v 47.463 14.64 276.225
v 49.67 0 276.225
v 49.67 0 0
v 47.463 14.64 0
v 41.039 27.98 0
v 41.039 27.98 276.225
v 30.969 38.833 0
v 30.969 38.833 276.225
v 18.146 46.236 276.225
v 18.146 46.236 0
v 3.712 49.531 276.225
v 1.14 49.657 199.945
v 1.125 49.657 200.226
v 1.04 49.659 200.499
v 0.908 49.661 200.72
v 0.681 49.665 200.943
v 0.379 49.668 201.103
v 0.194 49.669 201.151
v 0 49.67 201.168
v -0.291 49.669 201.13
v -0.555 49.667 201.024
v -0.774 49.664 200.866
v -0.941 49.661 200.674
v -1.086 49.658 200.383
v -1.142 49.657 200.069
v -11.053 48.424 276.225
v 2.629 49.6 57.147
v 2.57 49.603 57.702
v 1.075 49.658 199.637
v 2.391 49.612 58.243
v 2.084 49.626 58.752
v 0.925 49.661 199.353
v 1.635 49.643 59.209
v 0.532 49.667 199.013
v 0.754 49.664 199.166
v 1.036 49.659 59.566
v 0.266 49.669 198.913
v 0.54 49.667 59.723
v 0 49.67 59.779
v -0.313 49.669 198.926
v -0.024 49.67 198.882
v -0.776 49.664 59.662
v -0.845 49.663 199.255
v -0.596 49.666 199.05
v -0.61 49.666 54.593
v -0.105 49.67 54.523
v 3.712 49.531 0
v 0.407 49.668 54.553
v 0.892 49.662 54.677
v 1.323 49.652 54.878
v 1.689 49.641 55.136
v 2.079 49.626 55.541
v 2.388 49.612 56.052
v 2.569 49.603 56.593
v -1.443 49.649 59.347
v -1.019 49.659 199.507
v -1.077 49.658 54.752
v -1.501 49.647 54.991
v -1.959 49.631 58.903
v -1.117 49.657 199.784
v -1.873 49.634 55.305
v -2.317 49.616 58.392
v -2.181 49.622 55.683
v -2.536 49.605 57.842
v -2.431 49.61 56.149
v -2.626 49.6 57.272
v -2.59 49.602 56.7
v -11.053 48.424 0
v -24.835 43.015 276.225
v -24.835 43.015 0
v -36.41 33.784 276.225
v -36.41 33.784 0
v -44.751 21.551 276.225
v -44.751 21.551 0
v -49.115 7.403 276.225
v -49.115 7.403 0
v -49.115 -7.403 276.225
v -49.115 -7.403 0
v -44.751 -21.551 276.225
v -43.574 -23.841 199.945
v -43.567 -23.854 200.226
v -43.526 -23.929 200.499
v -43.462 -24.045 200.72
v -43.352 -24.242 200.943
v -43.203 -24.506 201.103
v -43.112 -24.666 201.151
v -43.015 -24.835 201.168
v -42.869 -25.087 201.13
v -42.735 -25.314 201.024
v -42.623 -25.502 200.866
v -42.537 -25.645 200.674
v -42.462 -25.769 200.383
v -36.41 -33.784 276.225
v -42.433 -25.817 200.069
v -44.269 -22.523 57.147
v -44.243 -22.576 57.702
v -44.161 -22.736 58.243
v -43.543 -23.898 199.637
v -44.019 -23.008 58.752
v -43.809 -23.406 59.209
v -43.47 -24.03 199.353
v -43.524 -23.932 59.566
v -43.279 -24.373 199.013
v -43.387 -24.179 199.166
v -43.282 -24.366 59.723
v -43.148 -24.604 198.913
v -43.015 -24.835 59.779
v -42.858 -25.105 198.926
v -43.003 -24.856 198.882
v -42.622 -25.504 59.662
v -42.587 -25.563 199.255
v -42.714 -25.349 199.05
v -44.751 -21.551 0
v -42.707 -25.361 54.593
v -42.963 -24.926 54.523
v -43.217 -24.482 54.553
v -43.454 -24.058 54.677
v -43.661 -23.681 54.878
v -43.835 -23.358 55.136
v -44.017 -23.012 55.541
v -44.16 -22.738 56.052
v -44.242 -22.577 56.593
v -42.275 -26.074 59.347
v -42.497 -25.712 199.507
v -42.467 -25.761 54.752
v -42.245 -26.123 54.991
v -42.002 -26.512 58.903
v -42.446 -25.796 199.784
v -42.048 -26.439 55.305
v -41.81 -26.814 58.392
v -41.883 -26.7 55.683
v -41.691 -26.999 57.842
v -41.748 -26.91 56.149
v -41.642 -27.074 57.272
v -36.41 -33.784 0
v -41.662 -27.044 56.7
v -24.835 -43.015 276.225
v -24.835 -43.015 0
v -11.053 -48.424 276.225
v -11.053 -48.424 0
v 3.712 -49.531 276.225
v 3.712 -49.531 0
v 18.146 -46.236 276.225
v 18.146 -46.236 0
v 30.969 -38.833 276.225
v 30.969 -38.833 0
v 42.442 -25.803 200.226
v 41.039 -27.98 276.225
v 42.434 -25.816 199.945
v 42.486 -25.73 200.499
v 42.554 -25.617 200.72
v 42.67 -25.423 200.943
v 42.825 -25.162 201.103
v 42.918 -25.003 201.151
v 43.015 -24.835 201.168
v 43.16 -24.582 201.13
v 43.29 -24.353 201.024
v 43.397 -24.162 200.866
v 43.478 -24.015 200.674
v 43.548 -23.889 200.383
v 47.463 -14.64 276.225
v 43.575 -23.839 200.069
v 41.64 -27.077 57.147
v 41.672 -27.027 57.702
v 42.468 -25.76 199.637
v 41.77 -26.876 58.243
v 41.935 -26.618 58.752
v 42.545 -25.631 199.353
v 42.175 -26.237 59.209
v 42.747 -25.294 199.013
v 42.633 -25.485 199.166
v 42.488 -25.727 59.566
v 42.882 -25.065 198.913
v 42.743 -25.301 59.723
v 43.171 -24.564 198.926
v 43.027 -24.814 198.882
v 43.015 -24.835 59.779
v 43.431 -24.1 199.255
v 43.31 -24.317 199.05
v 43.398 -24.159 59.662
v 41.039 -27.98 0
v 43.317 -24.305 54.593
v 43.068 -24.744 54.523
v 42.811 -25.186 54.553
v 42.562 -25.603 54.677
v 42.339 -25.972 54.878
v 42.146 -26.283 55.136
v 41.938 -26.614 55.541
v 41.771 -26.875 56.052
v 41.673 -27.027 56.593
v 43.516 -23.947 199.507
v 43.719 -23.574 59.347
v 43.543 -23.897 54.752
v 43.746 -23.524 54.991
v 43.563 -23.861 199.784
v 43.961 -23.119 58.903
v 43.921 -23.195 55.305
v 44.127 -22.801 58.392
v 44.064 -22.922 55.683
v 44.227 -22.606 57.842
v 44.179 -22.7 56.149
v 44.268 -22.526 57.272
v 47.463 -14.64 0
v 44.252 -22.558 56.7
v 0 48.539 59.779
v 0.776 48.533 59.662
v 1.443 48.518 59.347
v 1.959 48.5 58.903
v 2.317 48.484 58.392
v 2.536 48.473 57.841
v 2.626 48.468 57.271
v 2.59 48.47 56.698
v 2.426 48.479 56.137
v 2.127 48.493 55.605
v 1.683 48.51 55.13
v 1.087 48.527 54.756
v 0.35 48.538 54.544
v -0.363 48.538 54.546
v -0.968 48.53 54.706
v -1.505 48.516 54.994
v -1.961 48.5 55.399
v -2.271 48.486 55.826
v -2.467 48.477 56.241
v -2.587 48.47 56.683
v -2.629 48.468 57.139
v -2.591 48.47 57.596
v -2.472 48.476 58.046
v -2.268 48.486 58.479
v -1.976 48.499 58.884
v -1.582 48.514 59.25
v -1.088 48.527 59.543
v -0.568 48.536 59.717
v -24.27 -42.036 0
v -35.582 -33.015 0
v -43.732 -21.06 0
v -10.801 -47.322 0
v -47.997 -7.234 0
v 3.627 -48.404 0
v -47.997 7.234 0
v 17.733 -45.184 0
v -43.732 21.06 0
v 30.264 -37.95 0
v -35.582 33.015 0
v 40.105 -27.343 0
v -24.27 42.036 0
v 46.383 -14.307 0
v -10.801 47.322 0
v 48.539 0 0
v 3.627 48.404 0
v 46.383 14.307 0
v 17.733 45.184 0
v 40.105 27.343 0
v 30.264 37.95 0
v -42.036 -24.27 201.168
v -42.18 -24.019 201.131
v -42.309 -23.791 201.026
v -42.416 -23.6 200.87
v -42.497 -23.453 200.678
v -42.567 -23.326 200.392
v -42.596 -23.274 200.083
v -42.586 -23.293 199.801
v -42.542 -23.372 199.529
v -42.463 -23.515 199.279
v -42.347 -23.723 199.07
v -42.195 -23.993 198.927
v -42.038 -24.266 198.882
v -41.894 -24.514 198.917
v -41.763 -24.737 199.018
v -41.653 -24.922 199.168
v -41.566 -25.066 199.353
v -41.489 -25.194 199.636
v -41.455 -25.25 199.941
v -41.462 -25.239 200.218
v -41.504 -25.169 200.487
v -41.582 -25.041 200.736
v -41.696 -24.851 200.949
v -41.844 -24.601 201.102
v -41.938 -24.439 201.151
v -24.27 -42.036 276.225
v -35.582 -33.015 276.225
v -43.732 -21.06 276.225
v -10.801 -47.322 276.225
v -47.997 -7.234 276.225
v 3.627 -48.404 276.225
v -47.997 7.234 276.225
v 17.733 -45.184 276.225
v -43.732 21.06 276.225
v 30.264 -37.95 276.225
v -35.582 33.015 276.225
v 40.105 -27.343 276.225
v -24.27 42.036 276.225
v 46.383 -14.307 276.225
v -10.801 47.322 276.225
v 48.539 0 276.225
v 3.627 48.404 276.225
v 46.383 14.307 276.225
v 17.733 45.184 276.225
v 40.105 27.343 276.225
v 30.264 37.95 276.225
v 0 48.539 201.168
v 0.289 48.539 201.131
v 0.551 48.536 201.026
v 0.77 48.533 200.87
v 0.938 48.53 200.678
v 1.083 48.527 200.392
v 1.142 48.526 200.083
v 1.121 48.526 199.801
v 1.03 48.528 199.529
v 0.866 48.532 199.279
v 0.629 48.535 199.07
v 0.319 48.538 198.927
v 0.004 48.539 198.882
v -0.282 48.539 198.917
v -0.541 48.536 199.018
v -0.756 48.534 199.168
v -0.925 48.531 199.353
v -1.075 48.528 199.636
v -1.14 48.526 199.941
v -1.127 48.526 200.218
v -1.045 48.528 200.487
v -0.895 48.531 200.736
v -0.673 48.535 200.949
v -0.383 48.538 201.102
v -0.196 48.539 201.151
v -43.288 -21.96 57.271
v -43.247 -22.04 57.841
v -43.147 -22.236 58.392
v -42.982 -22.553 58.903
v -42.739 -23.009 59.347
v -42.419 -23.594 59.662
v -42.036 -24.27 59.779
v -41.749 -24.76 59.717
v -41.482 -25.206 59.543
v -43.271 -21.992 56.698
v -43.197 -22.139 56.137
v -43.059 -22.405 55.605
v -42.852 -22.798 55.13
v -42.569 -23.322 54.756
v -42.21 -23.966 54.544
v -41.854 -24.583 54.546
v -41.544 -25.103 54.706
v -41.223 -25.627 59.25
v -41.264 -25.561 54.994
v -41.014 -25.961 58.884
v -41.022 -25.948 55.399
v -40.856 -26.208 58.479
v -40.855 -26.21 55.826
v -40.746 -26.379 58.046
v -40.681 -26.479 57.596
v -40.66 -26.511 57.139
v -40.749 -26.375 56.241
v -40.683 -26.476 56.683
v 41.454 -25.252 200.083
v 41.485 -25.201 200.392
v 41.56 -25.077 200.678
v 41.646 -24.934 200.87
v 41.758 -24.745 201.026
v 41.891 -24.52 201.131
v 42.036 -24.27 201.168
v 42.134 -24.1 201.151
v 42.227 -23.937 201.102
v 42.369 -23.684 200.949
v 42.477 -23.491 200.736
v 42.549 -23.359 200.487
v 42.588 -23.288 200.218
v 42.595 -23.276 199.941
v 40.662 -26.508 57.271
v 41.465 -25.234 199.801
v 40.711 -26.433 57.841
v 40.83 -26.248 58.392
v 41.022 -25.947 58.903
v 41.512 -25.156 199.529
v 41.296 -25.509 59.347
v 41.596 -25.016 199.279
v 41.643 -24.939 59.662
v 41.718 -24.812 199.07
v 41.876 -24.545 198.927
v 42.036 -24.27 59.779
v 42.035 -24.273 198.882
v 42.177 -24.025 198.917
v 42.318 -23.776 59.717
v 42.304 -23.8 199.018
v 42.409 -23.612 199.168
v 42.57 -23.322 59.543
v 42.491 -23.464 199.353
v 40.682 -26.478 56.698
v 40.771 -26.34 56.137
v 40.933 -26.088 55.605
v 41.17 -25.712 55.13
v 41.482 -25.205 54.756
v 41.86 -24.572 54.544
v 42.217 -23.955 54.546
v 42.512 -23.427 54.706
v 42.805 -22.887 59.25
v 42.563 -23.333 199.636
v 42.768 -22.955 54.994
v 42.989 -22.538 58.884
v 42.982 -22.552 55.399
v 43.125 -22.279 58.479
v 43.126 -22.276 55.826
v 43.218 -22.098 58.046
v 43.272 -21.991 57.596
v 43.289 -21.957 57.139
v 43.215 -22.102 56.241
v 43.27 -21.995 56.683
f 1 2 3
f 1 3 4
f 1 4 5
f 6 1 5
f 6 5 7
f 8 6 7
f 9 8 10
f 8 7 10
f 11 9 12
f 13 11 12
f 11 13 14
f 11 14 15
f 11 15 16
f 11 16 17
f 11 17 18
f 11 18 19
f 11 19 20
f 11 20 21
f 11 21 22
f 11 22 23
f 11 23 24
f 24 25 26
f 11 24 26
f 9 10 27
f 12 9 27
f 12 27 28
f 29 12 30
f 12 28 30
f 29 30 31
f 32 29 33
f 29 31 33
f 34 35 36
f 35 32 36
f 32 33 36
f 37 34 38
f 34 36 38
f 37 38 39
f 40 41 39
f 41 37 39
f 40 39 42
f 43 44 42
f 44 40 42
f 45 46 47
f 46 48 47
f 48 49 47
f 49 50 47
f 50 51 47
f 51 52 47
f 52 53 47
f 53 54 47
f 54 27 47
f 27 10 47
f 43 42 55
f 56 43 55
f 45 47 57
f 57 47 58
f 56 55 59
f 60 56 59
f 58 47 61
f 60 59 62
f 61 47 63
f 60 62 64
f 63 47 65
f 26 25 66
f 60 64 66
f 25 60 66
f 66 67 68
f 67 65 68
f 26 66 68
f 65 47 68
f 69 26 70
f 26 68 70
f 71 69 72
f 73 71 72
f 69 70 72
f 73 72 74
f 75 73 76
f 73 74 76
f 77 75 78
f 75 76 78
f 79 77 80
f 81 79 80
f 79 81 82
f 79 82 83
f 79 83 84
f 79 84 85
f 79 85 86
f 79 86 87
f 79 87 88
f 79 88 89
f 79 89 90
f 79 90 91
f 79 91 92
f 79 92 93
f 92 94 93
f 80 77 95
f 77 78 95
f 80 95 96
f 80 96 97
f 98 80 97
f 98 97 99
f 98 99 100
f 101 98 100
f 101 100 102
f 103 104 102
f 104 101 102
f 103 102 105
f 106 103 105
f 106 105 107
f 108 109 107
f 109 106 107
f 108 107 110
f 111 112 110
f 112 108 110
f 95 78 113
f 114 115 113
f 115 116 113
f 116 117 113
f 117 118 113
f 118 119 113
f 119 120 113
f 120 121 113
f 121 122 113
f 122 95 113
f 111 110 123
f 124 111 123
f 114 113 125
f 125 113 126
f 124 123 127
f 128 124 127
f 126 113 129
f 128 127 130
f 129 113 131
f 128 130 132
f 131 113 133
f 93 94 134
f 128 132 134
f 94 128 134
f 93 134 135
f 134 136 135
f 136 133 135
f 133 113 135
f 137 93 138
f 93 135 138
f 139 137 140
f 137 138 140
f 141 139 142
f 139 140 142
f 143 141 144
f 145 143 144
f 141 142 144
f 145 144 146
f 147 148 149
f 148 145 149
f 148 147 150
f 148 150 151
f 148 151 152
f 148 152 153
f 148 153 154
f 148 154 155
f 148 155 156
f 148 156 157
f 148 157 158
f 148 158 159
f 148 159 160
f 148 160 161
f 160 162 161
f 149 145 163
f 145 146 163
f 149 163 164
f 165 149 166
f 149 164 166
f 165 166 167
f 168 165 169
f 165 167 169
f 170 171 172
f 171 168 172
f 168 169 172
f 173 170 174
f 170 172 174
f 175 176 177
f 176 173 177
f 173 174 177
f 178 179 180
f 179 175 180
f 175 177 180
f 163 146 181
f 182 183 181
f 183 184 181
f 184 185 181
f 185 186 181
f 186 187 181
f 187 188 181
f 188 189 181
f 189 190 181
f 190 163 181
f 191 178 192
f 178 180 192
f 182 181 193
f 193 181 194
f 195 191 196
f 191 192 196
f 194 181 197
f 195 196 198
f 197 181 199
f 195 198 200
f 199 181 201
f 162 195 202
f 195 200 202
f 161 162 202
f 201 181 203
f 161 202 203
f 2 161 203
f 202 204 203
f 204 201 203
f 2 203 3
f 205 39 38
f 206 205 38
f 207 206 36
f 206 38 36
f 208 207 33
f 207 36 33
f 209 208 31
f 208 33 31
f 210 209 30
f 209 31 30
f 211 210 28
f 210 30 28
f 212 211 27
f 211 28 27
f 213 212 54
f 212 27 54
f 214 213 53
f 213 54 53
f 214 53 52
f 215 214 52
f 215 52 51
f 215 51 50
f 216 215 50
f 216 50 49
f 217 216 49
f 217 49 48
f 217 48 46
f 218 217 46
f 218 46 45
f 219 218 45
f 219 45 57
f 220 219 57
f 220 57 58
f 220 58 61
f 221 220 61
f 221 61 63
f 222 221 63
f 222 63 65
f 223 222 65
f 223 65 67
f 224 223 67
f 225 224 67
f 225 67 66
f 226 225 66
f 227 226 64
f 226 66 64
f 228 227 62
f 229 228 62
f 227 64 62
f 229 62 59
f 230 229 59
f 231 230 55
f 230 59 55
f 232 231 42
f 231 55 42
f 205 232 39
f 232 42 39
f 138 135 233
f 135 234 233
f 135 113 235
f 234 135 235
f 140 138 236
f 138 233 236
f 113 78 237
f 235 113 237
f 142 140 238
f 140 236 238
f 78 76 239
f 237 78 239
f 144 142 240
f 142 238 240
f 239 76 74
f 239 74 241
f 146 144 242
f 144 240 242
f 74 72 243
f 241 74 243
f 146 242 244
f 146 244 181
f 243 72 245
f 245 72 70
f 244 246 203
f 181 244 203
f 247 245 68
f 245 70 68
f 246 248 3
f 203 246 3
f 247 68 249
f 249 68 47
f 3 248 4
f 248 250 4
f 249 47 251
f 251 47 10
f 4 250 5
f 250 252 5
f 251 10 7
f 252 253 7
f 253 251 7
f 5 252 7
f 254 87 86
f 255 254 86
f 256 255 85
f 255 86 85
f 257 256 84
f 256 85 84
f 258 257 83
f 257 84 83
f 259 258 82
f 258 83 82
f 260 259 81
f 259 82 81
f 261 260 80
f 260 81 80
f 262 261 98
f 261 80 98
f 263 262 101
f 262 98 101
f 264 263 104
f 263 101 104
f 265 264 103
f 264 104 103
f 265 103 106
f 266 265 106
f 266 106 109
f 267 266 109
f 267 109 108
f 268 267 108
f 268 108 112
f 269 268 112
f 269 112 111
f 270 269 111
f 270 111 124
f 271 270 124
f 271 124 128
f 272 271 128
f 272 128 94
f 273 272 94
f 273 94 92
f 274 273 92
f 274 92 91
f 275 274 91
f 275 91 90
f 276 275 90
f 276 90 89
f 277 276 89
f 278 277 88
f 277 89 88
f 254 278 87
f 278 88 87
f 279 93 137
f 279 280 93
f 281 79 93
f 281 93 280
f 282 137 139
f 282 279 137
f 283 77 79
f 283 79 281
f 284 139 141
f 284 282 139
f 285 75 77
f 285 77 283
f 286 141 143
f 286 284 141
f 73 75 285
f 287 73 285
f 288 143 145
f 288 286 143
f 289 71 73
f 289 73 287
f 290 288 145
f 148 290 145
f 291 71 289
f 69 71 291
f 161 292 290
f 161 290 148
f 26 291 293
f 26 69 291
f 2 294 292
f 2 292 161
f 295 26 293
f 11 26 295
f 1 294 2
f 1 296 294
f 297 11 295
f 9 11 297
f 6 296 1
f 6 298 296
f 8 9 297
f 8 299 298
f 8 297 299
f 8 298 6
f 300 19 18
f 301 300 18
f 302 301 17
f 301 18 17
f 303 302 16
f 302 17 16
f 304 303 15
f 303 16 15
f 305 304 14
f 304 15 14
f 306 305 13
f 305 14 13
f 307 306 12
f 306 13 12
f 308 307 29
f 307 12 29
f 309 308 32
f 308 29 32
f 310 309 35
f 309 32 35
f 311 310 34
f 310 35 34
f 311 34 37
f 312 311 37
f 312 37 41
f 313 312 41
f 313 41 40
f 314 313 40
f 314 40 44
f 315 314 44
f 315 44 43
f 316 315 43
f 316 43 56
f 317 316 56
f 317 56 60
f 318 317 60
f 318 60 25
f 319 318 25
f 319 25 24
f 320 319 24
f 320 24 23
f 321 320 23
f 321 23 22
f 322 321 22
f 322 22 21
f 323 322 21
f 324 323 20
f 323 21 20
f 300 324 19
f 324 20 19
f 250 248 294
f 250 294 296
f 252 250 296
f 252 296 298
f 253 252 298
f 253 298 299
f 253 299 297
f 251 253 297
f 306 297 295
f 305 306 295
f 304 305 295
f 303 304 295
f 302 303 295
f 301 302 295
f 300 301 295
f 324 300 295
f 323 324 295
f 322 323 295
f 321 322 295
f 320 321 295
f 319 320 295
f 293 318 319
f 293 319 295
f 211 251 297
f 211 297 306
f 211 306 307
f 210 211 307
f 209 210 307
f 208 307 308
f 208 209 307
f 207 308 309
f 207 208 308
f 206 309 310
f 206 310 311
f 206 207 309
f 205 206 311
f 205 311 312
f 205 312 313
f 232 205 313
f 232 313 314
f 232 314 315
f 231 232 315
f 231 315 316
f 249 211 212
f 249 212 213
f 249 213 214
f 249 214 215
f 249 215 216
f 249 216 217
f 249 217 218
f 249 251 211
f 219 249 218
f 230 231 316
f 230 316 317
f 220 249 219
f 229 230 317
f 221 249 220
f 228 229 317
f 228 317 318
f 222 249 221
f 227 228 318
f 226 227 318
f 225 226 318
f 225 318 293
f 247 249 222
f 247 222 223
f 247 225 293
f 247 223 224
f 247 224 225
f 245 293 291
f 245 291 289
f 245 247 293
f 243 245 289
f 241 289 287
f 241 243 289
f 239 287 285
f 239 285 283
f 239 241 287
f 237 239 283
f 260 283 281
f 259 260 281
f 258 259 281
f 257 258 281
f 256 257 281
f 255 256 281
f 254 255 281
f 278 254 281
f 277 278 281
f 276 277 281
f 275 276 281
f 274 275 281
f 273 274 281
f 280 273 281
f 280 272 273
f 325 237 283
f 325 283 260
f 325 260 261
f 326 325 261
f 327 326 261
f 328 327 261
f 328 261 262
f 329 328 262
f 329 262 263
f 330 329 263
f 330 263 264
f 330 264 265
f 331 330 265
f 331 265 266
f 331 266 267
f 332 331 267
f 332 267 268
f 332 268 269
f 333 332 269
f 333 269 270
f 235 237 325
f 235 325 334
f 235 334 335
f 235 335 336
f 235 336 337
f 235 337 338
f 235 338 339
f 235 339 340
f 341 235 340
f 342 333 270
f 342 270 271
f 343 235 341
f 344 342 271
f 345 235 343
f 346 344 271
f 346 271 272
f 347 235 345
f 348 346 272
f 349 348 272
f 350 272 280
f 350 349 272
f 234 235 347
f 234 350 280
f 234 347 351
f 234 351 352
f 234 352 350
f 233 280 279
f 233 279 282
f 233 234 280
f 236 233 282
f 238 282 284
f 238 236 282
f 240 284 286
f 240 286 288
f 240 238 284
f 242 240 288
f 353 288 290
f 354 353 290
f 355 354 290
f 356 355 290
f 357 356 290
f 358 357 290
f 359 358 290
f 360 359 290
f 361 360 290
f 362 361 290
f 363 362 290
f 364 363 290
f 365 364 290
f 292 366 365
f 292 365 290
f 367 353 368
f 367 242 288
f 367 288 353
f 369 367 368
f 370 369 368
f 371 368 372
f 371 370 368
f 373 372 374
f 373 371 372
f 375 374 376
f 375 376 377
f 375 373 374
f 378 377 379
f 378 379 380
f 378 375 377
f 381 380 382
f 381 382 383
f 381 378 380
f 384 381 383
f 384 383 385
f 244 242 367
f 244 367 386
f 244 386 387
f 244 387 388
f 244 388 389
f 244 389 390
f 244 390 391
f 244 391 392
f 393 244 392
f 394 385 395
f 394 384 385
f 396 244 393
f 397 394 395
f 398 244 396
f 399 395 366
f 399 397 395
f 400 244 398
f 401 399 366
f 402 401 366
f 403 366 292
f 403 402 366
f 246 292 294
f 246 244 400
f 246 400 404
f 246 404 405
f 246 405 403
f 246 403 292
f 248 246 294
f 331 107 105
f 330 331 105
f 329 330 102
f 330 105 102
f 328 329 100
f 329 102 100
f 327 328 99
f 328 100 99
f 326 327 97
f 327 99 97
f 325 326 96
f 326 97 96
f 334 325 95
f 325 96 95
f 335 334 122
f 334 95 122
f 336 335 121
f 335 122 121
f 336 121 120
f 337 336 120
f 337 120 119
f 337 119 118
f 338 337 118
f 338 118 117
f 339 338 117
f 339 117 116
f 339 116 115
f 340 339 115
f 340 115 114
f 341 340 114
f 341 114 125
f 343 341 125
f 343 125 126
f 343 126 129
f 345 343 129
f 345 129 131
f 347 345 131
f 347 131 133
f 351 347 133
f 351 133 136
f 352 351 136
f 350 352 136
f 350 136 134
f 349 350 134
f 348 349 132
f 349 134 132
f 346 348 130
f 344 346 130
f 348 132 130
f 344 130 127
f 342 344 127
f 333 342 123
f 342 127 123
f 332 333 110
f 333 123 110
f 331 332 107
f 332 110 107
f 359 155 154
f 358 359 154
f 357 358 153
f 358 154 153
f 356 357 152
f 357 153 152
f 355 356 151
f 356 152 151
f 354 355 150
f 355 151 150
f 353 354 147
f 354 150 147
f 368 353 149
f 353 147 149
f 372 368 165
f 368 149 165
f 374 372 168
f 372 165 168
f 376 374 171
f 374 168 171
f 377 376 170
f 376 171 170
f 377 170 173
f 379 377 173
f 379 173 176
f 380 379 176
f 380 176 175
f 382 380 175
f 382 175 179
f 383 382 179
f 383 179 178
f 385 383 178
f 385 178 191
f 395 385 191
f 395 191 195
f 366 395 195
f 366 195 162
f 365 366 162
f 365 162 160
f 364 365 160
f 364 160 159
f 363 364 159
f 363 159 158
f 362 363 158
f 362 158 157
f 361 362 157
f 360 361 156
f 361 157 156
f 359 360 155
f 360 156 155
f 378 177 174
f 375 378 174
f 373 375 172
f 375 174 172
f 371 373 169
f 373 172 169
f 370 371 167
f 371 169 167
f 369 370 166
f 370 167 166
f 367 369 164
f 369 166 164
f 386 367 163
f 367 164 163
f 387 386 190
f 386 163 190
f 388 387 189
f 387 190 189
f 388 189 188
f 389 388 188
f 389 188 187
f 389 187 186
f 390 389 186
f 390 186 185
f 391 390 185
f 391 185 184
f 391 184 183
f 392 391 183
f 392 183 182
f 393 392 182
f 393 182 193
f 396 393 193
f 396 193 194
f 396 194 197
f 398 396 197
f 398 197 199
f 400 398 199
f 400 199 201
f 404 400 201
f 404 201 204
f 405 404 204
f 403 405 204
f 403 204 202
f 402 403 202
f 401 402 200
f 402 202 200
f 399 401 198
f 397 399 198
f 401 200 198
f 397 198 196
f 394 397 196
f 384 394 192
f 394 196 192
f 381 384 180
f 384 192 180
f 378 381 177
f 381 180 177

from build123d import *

# Parameters (mm, degrees)
SKETCH1_R                = 49.6697
SKETCH1_R_2              = 48.5394
BOSS_EXTRUDE1_DEPTH      = 276.225
SKETCH2_R                = 2.6289
SKETCH2_R_2              = 1.143
F_8_32_T_NUT_HOLES_DEPTH = 5.08
CIRPATTERN1_COUNT        = 3


with BuildPart() as part:
    # Sketch1 → Boss-Extrude1 (new body)
    with BuildSketch(Plane.XY):
        Circle(SKETCH1_R)
        Circle(SKETCH1_R_2, mode=Mode.SUBTRACT)
    extrude(amount=BOSS_EXTRUDE1_DEPTH)

    # Sketch2 → 8-32 T-Nut Holes (cut)
    with BuildSketch(Plane(origin=(0, 49.6697, 0), x_dir=(1, 0, 0), z_dir=(0, 1, 0))):
        with Locations(Location((0, -57.15, 0), (0, 0, 270))):
            Circle(SKETCH2_R)
        with Locations(Location((0, -200.025, 0), (0, 0, 270))):
            Circle(SKETCH2_R_2)
    f_8_32_t_nut_holes = extrude(amount=-F_8_32_T_NUT_HOLES_DEPTH, mode=Mode.SUBTRACT)

    # CirPattern1: 8-32 T-Nut Holes ×3 about axis
    cirpattern1_axis = Axis((0, 0, 276.225), (0, 0, -1))
    for i in range(1, CIRPATTERN1_COUNT):
        add(f_8_32_t_nut_holes.rotate(cirpattern1_axis, i * 360 / CIRPATTERN1_COUNT), mode=Mode.SUBTRACT)


solid = part.part
